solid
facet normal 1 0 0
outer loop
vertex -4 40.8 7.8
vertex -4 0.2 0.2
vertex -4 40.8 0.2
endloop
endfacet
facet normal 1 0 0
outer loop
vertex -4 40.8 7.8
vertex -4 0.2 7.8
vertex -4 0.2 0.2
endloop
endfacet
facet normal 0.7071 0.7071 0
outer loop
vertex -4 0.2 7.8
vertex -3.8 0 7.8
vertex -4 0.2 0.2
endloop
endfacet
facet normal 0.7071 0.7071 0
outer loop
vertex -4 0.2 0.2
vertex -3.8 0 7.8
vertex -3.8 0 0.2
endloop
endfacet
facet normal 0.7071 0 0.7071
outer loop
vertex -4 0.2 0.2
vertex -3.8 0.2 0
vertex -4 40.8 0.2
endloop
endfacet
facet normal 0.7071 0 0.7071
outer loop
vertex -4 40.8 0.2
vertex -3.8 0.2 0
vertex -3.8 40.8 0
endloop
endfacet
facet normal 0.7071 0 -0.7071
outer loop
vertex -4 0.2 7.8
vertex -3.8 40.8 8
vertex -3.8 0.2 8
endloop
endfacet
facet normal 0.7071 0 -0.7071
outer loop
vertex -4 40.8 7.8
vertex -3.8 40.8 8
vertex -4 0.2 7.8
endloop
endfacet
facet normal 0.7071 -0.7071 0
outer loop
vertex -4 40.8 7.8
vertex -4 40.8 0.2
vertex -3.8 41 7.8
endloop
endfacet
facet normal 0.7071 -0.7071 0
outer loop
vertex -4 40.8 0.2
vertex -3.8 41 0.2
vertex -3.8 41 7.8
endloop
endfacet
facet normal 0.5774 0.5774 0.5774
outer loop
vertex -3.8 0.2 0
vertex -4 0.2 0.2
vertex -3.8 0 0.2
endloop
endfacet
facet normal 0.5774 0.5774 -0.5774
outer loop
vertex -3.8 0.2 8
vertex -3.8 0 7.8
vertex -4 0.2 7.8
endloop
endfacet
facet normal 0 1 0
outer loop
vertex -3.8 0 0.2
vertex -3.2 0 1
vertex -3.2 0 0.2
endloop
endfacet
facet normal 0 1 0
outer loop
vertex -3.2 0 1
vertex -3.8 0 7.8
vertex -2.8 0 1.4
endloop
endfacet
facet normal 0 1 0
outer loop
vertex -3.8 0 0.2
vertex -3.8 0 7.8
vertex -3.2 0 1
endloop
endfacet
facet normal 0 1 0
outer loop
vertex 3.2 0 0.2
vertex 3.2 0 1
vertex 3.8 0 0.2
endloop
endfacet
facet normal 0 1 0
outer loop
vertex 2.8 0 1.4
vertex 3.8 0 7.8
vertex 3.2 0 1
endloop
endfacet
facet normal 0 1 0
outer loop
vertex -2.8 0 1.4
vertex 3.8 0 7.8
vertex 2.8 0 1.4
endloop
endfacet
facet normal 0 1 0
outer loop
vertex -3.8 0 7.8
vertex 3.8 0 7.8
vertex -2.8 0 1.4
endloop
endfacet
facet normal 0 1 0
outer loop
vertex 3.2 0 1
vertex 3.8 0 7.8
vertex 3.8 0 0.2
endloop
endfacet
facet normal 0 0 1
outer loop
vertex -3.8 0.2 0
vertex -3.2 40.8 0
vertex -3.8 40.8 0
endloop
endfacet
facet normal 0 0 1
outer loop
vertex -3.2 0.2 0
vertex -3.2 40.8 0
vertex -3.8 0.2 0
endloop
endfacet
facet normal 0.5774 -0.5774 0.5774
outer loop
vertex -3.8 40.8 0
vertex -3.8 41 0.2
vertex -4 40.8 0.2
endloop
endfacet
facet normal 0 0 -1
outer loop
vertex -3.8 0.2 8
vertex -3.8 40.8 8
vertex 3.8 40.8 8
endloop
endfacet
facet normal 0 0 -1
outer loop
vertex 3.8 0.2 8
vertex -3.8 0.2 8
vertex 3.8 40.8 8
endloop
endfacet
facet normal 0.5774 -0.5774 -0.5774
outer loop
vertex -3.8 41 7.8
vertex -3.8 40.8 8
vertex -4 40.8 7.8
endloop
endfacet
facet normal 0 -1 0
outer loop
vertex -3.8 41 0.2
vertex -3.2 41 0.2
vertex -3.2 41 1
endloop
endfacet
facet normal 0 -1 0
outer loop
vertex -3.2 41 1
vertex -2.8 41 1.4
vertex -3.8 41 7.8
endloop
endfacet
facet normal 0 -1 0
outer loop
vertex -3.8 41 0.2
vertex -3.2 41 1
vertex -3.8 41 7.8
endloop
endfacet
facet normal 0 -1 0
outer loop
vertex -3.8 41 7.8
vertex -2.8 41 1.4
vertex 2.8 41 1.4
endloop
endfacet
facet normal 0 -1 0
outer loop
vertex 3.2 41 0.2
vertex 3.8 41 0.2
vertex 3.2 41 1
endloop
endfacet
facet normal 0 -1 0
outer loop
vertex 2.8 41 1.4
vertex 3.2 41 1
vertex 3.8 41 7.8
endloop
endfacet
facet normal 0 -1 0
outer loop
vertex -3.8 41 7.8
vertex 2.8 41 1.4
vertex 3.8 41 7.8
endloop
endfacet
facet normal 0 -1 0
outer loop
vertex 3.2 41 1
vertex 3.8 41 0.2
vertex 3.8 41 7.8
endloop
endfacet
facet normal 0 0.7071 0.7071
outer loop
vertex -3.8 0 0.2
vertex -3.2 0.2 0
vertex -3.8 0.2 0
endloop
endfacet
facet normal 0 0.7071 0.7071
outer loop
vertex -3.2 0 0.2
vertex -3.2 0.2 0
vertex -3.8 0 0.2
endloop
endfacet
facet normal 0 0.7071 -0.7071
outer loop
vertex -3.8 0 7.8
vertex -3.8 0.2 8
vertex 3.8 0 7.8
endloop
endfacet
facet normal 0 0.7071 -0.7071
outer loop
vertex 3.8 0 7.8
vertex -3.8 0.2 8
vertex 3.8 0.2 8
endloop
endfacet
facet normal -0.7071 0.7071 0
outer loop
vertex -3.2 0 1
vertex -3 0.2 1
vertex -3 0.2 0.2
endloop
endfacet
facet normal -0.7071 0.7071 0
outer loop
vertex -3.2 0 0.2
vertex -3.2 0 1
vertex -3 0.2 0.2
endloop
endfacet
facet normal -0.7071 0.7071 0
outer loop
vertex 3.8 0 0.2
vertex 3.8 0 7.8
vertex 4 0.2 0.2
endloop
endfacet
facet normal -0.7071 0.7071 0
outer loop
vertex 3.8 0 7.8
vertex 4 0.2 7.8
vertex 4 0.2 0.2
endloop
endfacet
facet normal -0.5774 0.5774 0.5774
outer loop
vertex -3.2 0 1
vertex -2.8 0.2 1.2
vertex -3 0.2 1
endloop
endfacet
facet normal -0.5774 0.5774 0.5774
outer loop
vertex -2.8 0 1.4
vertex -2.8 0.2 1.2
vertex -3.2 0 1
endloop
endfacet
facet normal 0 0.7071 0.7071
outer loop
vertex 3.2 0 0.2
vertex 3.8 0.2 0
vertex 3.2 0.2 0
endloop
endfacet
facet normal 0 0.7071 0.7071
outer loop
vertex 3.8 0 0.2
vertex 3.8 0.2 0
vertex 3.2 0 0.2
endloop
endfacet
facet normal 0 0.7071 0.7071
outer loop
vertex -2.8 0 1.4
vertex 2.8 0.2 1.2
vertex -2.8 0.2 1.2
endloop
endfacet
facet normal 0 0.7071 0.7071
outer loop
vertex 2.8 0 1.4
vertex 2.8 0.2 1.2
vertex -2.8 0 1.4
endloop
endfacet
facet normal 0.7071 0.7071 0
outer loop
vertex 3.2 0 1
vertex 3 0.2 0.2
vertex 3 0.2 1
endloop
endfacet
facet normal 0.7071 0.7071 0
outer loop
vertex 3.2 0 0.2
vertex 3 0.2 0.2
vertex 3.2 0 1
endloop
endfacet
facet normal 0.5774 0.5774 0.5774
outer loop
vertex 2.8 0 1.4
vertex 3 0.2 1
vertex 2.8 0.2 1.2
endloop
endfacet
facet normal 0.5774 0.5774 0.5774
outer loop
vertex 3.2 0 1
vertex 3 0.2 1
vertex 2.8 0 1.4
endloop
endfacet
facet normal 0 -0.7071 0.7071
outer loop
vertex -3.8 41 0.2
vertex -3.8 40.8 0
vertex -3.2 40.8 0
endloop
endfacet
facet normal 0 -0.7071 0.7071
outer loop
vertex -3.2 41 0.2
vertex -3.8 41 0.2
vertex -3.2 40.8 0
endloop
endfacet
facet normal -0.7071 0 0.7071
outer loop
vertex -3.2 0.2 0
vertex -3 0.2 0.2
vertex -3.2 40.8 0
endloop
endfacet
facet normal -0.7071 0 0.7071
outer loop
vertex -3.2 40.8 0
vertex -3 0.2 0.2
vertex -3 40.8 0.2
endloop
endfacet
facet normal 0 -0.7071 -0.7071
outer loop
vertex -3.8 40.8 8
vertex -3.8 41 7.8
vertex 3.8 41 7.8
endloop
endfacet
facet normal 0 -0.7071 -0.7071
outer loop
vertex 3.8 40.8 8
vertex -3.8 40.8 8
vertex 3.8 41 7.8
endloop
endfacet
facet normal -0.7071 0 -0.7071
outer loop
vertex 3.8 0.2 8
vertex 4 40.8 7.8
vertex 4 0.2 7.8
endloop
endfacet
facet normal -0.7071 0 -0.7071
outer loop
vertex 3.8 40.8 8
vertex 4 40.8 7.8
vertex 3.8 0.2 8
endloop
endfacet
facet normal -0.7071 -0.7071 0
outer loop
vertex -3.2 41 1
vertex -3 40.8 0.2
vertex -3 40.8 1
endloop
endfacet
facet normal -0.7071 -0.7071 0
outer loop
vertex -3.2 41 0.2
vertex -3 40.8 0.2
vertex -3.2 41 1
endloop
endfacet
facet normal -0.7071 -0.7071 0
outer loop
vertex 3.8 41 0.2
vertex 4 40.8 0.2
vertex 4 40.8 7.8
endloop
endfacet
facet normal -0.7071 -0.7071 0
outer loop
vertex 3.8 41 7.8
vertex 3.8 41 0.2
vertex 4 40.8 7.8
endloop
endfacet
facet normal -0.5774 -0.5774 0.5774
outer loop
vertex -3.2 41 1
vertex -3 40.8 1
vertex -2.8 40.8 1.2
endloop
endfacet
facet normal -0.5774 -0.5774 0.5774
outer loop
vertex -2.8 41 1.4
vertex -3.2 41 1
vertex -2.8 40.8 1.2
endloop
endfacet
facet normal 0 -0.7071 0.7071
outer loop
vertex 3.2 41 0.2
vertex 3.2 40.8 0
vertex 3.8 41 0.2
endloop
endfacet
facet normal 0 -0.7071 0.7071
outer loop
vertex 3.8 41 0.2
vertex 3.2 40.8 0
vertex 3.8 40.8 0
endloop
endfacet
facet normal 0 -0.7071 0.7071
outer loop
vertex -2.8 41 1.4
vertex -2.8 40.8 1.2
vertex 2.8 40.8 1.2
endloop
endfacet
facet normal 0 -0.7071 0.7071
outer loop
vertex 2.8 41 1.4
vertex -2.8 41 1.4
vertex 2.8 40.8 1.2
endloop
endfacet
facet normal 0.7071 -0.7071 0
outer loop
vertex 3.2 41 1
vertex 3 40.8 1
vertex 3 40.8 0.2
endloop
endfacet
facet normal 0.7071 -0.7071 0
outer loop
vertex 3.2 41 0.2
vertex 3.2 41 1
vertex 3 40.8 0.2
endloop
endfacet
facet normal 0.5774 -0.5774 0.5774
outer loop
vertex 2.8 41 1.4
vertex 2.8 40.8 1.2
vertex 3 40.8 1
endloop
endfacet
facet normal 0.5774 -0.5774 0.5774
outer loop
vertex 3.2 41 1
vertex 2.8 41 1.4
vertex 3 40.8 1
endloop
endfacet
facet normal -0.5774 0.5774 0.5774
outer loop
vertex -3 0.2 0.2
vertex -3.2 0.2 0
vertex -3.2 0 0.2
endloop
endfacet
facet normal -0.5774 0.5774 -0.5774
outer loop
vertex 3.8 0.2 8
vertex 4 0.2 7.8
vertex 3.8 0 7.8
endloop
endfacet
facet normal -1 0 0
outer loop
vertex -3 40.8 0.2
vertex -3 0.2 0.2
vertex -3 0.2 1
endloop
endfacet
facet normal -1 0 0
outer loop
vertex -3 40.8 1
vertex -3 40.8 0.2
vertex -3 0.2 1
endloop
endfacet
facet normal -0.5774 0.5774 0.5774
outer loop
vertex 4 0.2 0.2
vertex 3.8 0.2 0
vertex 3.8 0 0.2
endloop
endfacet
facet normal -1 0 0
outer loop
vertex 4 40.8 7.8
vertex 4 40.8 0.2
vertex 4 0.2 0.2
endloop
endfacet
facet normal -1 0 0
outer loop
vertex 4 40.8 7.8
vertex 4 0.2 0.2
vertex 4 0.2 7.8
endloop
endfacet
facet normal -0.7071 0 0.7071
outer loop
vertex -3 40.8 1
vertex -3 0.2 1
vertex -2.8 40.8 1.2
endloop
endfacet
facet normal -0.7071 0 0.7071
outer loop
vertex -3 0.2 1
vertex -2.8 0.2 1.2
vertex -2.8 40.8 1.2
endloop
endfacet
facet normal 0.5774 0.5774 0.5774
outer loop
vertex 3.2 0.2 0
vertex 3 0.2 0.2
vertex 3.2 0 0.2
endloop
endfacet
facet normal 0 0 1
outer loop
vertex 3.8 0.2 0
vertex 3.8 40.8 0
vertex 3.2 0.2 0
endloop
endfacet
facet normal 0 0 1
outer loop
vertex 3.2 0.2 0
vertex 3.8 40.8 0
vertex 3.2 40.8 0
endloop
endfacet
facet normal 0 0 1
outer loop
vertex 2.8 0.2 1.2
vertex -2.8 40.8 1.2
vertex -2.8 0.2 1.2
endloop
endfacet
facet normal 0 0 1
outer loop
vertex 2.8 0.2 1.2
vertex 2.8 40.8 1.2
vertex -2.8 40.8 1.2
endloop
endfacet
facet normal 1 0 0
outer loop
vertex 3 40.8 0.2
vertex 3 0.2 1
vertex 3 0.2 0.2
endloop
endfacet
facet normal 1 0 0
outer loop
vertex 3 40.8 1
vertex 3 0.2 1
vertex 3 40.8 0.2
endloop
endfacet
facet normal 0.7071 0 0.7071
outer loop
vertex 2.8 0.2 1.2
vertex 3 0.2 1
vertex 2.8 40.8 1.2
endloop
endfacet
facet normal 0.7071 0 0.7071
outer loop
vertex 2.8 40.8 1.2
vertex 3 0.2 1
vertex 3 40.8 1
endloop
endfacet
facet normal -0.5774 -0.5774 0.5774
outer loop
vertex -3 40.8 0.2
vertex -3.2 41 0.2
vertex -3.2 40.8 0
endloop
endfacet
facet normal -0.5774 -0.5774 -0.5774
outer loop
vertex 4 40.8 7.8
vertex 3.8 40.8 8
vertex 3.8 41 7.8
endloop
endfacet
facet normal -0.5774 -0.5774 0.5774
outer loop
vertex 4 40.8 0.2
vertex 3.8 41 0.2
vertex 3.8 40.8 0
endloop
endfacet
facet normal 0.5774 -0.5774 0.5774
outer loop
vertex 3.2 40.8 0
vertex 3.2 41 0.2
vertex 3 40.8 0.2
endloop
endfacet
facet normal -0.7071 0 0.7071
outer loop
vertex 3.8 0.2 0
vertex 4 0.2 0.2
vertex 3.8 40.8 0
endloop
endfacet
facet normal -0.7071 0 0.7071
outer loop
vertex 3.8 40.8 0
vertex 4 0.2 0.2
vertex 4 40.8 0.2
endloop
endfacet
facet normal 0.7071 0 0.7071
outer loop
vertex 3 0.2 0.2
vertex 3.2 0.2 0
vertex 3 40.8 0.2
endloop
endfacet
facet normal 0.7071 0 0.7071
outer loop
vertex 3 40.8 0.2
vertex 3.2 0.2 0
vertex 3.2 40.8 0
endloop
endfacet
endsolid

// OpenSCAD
// Generated by spec/build_parent_gnss.py; dimensions and edge finishing are parametric there.
polyhedron(points=[[-4.0, 40.79999923706055, 0.20000000298023224], [-4.0, 0.20000000298023224, 0.20000000298023224], [-4.0, 40.79999923706055, 7.800000190734863], [-4.0, 0.20000000298023224, 7.800000190734863], [-3.799999952316284, -7.405201423238482e-17, 7.800000190734863], [-3.799999952316284, 1.1783848246818942e-16, 0.20000000298023224], [-3.799999952316284, 0.20000000298023224, 1.1808391026465635e-16], [-3.799999952316284, 40.79999923706055, -6.548555181428437e-16], [-3.799999952316284, 0.20000000298023224, 8.0], [-3.799999952316284, 40.79999923706055, 8.0], [-3.799999952316284, 41.0, 7.800000190734863], [-3.799999952316284, 41.0, 0.20000000298023224], [-3.200000047683716, 1.1857475262270042e-16, 0.20000000298023224], [-3.200000047683716, 0.0, 1.0], [-2.799999952316284, 0.0, 1.399999976158142], [3.799999952316284, 1.1783848246818942e-16, 0.20000000298023224], [3.200000047683716, 0.0, 1.0], [3.200000047683716, 1.1857475262270042e-16, 0.20000000298023224], [3.799999952316284, -6.938893903907228e-17, 7.800000190734863], [2.799999952316284, 0.0, 1.399999976158142], [-3.200000047683716, 40.79999923706055, -6.544873764481433e-16], [-3.200000047683716, 0.20000000298023224, 1.1808391026465635e-16], [3.799999952316284, 40.79999923706055, 8.0], [3.799999952316284, 0.20000000298023224, 8.0], [-3.200000047683716, 41.0, 1.0], [-3.200000047683716, 41.0, 0.20000000298023224], [-2.799999952316284, 41.0, 1.399999976158142], [2.799999952316284, 41.0, 1.399999976158142], [3.200000047683716, 41.0, 1.0], [3.799999952316284, 41.0, 0.20000000298023224], [3.200000047683716, 41.0, 0.20000000298023224], [3.799999952316284, 41.0, 7.800000190734863], [-3.0, 0.20000000298023224, 0.20000000298023224], [-3.0, 0.20000000298023224, 1.0], [4.0, 0.20000000298023224, 0.20000000298023224], [4.0, 0.20000000298023224, 7.800000190734863], [-2.799999952316284, 0.20000000298023224, 1.2000000476837158], [3.200000047683716, 0.20000000298023224, 1.1808391026465635e-16], [3.799999952316284, 0.20000000298023224, 1.1808391026465635e-16], [2.799999952316284, 0.20000000298023224, 1.2000000476837158], [3.0, 0.20000000298023224, 1.0], [3.0, 0.20000000298023224, 0.20000000298023224], [-3.0, 40.79999923706055, 0.20000000298023224], [4.0, 40.79999923706055, 7.800000190734863], [-3.0, 40.79999923706055, 1.0], [4.0, 40.79999923706055, 0.20000000298023224], [-2.799999952316284, 40.79999923706055, 1.2000000476837158], [3.200000047683716, 40.79999923706055, -6.548555181428437e-16], [3.799999952316284, 40.79999923706055, -6.544873764481433e-16], [2.799999952316284, 40.79999923706055, 1.2000000476837158], [3.0, 40.79999923706055, 0.20000000298023224], [3.0, 40.79999923706055, 1.0]],faces=[[0, 1, 2], [1, 3, 2], [1, 4, 3], [5, 4, 1], [0, 6, 1], [7, 6, 0], [8, 9, 3], [3, 9, 2], [10, 0, 2], [10, 11, 0], [5, 1, 6], [3, 4, 8], [12, 13, 5], [14, 4, 13], [13, 4, 5], [15, 16, 17], [16, 18, 19], [19, 18, 14], [14, 18, 4], [15, 18, 16], [7, 20, 6], [6, 20, 21], [0, 11, 7], [22, 9, 8], [22, 8, 23], [2, 9, 10], [24, 25, 11], [10, 26, 24], [10, 24, 11], [27, 26, 10], [28, 29, 30], [31, 28, 27], [31, 27, 10], [31, 29, 28], [6, 21, 5], [5, 21, 12], [18, 8, 4], [23, 8, 18], [32, 33, 13], [32, 13, 12], [34, 18, 15], [34, 35, 18], [33, 36, 13], [13, 36, 14], [37, 38, 17], [17, 38, 15], [36, 39, 14], [14, 39, 19], [40, 41, 16], [16, 41, 17], [39, 40, 19], [19, 40, 16], [20, 7, 11], [20, 11, 25], [20, 32, 21], [42, 32, 20], [31, 10, 9], [31, 9, 22], [35, 43, 23], [23, 43, 22], [44, 42, 24], [24, 42, 25], [43, 45, 29], [43, 29, 31], [46, 44, 24], [46, 24, 26], [29, 47, 30], [48, 47, 29], [49, 46, 26], [49, 26, 27], [50, 51, 28], [50, 28, 30], [51, 49, 27], [51, 27, 28], [12, 21, 32], [18, 35, 23], [33, 32, 42], [33, 42, 44], [15, 38, 34], [34, 45, 43], [35, 34, 43], [46, 33, 44], [46, 36, 33], [17, 41, 37], [37, 48, 38], [47, 48, 37], [36, 46, 39], [46, 49, 39], [41, 40, 50], [50, 40, 51], [49, 40, 39], [51, 40, 49], [20, 25, 42], [31, 22, 43], [48, 29, 45], [50, 30, 47], [48, 34, 38], [45, 34, 48], [50, 37, 41], [47, 37, 50]],convexity=10);
